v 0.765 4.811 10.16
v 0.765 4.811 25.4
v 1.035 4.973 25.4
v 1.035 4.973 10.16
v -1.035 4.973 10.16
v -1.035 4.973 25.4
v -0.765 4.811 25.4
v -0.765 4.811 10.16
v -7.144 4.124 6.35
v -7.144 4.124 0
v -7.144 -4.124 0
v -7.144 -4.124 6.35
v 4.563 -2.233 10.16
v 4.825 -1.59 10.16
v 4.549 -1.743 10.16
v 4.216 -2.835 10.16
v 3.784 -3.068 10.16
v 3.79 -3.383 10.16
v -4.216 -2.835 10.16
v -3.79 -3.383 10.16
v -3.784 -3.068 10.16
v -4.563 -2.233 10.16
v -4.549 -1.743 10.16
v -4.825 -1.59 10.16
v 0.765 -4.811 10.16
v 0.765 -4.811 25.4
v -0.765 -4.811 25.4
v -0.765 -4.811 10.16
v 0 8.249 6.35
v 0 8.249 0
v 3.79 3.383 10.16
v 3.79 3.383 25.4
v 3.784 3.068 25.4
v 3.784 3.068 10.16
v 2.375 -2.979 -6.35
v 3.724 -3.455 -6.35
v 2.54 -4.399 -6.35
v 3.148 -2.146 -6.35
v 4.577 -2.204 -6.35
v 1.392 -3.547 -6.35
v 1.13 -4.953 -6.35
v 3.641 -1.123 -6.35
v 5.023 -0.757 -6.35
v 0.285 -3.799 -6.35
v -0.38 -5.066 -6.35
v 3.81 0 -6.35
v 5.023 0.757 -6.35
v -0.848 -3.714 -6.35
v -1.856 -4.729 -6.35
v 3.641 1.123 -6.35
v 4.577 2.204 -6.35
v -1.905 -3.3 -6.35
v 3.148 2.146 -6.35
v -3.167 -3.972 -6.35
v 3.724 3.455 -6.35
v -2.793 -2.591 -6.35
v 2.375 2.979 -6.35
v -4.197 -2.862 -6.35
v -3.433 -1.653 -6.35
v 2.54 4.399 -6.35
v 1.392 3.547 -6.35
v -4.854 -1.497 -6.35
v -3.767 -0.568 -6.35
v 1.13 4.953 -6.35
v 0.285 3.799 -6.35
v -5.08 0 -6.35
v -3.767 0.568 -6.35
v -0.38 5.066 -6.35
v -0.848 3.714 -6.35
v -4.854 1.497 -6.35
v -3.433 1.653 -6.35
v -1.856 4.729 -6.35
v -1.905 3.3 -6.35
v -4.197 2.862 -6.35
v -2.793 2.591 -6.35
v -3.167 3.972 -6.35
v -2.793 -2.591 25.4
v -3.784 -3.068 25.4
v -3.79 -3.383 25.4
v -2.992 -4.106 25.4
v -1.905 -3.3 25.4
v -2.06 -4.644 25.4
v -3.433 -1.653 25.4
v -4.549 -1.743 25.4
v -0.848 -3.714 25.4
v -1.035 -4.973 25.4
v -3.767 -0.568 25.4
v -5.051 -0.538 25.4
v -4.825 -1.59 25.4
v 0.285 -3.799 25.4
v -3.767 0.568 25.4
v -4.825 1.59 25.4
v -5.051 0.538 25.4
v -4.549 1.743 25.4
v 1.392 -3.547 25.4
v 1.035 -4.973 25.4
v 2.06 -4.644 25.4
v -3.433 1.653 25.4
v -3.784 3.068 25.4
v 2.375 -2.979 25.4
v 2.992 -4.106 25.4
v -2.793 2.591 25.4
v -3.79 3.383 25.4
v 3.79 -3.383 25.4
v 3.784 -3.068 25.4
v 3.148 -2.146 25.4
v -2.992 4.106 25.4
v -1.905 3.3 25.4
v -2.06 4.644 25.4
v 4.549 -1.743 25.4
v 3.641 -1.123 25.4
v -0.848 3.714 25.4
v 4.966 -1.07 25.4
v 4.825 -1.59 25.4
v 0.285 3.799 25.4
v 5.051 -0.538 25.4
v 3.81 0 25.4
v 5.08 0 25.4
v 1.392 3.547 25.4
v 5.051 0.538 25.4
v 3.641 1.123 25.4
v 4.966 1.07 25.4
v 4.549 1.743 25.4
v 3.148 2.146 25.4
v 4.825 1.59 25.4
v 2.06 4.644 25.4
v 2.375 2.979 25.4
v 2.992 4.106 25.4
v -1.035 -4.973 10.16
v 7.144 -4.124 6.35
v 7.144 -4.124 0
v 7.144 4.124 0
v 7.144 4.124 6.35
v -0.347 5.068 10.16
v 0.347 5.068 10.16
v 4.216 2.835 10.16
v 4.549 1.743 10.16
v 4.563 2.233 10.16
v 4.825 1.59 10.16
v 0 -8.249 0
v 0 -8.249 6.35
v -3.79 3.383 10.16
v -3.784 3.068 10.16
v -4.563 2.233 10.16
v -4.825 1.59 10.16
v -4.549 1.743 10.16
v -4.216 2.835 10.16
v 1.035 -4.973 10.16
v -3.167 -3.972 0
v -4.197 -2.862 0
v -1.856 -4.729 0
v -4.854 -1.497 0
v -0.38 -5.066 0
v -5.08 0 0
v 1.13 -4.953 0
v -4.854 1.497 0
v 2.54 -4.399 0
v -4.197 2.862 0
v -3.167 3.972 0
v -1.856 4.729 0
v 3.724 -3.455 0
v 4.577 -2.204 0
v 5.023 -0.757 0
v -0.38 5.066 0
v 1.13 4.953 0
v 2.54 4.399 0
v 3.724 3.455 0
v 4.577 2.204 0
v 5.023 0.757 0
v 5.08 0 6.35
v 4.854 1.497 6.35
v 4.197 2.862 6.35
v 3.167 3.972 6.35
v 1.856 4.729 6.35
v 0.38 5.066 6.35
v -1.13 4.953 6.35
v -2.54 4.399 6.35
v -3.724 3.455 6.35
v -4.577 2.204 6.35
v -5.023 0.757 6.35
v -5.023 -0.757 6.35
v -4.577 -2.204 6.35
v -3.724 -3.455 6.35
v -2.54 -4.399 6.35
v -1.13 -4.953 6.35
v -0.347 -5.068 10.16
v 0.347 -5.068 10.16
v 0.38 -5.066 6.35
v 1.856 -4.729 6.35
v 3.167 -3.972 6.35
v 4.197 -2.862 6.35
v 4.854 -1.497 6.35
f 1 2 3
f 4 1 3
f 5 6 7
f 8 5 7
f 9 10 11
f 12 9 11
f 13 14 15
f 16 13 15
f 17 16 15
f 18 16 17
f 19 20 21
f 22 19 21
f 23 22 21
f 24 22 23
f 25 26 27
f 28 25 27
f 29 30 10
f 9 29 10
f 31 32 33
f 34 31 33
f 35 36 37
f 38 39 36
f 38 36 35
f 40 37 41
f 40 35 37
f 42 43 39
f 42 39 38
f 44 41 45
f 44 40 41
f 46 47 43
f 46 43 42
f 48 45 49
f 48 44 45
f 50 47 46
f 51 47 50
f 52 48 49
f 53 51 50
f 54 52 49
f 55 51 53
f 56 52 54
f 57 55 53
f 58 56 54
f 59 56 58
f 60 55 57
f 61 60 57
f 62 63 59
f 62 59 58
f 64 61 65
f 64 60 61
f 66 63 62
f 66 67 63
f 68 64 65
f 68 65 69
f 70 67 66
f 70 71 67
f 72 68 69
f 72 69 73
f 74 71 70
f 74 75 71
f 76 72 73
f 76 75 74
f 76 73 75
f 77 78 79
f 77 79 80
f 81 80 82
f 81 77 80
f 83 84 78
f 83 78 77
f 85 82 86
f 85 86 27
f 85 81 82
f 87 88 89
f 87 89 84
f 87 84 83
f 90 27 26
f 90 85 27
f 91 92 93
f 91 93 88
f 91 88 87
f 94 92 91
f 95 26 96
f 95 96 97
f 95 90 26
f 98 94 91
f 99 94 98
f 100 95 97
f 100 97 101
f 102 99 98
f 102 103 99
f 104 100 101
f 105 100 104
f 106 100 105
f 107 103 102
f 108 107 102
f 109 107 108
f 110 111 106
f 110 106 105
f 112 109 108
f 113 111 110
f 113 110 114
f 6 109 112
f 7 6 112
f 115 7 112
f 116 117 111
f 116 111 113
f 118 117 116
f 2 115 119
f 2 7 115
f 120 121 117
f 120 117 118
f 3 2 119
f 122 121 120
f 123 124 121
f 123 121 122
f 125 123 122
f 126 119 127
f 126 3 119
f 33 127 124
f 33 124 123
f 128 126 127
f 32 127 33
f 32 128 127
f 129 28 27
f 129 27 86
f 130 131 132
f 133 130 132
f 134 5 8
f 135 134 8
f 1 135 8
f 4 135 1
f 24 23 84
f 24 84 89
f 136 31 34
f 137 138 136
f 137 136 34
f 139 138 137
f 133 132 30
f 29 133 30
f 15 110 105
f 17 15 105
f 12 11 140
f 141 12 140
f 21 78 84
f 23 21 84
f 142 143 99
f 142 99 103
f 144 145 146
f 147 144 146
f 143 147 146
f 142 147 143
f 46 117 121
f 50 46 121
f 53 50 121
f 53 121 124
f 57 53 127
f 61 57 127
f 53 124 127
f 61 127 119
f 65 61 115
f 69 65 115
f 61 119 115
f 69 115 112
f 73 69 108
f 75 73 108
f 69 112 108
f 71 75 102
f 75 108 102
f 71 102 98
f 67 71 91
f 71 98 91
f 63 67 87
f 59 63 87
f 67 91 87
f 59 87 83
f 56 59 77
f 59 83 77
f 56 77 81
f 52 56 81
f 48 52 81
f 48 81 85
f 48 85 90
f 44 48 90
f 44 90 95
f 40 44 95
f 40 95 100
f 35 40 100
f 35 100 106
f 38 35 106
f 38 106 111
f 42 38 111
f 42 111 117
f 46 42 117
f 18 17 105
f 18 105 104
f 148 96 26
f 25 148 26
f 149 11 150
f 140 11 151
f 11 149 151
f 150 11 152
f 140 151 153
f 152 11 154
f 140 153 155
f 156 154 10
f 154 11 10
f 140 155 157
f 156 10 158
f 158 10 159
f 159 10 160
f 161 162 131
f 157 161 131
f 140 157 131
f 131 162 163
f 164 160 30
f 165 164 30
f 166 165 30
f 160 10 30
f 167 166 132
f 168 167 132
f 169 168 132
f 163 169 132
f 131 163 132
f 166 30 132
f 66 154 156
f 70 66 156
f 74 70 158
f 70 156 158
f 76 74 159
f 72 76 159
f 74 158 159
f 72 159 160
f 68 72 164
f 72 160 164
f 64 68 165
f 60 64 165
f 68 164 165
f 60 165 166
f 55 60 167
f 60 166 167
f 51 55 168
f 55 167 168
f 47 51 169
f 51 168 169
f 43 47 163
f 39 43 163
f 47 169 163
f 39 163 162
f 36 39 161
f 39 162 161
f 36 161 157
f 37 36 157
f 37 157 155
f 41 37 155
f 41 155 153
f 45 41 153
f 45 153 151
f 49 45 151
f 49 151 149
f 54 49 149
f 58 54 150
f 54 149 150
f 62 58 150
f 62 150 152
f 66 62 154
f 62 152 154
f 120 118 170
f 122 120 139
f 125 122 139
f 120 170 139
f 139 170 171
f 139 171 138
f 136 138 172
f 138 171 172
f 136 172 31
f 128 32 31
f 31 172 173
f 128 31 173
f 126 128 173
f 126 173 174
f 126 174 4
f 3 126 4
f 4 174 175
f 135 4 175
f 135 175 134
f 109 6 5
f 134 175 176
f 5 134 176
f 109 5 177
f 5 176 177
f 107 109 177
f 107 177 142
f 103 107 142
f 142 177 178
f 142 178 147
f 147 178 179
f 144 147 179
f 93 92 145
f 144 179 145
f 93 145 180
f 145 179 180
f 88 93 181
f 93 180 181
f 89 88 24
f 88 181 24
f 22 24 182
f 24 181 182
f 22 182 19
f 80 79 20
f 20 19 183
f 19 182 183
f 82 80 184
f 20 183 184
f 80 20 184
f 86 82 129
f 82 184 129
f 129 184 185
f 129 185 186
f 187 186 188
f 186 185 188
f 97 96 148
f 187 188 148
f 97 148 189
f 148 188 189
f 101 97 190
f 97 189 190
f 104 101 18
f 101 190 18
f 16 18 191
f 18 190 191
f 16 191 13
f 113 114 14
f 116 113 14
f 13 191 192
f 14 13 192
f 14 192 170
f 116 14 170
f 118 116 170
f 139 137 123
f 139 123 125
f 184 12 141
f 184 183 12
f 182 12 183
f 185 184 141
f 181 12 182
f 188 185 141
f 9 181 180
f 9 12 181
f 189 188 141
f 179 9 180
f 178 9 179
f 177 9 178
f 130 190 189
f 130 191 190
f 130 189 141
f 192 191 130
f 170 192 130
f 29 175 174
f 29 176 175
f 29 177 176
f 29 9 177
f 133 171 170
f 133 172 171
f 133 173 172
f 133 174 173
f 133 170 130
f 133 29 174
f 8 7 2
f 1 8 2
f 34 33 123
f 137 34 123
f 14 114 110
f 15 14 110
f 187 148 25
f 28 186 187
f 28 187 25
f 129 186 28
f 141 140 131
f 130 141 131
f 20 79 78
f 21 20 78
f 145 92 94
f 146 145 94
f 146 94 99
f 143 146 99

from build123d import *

# Parameters (mm, degrees)
BOSS_EXTRUDE1_DEPTH = 6.35
SKETCH2_R           = 5.08
BOSS_EXTRUDE2_DEPTH = 6.35
SKETCH3_R           = 5.08
BOSS_EXTRUDE3_DEPTH = 19.05
SKETCH4_R           = 3.81
CUT_EXTRUDE1_DEPTH  = 32.75
CUT_EXTRUDE2_DEPTH  = 15.24
CIRPATTERN1_COUNT   = 6


with BuildPart() as part:
    # Sketch1 → Boss-Extrude1 (new body)
    with BuildSketch(Plane.XY):
        Polygon((0, 8.248891971), (-7.14375, 4.124445986), (-7.14375, -4.124445986), (0, -8.248891971), (7.14375, -4.124445986), (7.14375, 4.124445986), align=None)
    extrude(amount=BOSS_EXTRUDE1_DEPTH)

    # Sketch2 → Boss-Extrude2 (add)
    with BuildSketch(Plane(origin=(0, 0, 0), x_dir=(-1, 0, 0), z_dir=(0, 0, -1))):
        Circle(SKETCH2_R)
    extrude(amount=BOSS_EXTRUDE2_DEPTH)

    # Sketch3 → Boss-Extrude3 (add)
    with BuildSketch(Plane.XY.offset(6.35)):
        Circle(SKETCH3_R)
    extrude(amount=BOSS_EXTRUDE3_DEPTH)

    # Sketch4 → Cut-Extrude1 (cut, through all)
    with BuildSketch(Plane.XY.offset(25.4)):
        Circle(SKETCH4_R)
    extrude(amount=-CUT_EXTRUDE1_DEPTH, mode=Mode.SUBTRACT)

    # Sketch5 → Cut-Extrude2 (cut)
    with BuildSketch(Plane.XY.offset(25.4)):
        Polygon((0, 4.810914796), (0.765045953, 4.810914796), (1.27, 5.114868927), (0, 5.114868927), (-1.27, 5.114868927), (-0.765045953, 4.810914796), align=None)
    cut_extrude2 = extrude(amount=-CUT_EXTRUDE2_DEPTH, mode=Mode.SUBTRACT)

    # CirPattern1: Cut-Extrude2 ×6 about axis
    cirpattern1_axis = Axis((0, 0, 0), (0, 0, 1))
    for i in range(1, CIRPATTERN1_COUNT):
        add(cut_extrude2.rotate(cirpattern1_axis, i * 360 / CIRPATTERN1_COUNT), mode=Mode.SUBTRACT)


solid = part.part
